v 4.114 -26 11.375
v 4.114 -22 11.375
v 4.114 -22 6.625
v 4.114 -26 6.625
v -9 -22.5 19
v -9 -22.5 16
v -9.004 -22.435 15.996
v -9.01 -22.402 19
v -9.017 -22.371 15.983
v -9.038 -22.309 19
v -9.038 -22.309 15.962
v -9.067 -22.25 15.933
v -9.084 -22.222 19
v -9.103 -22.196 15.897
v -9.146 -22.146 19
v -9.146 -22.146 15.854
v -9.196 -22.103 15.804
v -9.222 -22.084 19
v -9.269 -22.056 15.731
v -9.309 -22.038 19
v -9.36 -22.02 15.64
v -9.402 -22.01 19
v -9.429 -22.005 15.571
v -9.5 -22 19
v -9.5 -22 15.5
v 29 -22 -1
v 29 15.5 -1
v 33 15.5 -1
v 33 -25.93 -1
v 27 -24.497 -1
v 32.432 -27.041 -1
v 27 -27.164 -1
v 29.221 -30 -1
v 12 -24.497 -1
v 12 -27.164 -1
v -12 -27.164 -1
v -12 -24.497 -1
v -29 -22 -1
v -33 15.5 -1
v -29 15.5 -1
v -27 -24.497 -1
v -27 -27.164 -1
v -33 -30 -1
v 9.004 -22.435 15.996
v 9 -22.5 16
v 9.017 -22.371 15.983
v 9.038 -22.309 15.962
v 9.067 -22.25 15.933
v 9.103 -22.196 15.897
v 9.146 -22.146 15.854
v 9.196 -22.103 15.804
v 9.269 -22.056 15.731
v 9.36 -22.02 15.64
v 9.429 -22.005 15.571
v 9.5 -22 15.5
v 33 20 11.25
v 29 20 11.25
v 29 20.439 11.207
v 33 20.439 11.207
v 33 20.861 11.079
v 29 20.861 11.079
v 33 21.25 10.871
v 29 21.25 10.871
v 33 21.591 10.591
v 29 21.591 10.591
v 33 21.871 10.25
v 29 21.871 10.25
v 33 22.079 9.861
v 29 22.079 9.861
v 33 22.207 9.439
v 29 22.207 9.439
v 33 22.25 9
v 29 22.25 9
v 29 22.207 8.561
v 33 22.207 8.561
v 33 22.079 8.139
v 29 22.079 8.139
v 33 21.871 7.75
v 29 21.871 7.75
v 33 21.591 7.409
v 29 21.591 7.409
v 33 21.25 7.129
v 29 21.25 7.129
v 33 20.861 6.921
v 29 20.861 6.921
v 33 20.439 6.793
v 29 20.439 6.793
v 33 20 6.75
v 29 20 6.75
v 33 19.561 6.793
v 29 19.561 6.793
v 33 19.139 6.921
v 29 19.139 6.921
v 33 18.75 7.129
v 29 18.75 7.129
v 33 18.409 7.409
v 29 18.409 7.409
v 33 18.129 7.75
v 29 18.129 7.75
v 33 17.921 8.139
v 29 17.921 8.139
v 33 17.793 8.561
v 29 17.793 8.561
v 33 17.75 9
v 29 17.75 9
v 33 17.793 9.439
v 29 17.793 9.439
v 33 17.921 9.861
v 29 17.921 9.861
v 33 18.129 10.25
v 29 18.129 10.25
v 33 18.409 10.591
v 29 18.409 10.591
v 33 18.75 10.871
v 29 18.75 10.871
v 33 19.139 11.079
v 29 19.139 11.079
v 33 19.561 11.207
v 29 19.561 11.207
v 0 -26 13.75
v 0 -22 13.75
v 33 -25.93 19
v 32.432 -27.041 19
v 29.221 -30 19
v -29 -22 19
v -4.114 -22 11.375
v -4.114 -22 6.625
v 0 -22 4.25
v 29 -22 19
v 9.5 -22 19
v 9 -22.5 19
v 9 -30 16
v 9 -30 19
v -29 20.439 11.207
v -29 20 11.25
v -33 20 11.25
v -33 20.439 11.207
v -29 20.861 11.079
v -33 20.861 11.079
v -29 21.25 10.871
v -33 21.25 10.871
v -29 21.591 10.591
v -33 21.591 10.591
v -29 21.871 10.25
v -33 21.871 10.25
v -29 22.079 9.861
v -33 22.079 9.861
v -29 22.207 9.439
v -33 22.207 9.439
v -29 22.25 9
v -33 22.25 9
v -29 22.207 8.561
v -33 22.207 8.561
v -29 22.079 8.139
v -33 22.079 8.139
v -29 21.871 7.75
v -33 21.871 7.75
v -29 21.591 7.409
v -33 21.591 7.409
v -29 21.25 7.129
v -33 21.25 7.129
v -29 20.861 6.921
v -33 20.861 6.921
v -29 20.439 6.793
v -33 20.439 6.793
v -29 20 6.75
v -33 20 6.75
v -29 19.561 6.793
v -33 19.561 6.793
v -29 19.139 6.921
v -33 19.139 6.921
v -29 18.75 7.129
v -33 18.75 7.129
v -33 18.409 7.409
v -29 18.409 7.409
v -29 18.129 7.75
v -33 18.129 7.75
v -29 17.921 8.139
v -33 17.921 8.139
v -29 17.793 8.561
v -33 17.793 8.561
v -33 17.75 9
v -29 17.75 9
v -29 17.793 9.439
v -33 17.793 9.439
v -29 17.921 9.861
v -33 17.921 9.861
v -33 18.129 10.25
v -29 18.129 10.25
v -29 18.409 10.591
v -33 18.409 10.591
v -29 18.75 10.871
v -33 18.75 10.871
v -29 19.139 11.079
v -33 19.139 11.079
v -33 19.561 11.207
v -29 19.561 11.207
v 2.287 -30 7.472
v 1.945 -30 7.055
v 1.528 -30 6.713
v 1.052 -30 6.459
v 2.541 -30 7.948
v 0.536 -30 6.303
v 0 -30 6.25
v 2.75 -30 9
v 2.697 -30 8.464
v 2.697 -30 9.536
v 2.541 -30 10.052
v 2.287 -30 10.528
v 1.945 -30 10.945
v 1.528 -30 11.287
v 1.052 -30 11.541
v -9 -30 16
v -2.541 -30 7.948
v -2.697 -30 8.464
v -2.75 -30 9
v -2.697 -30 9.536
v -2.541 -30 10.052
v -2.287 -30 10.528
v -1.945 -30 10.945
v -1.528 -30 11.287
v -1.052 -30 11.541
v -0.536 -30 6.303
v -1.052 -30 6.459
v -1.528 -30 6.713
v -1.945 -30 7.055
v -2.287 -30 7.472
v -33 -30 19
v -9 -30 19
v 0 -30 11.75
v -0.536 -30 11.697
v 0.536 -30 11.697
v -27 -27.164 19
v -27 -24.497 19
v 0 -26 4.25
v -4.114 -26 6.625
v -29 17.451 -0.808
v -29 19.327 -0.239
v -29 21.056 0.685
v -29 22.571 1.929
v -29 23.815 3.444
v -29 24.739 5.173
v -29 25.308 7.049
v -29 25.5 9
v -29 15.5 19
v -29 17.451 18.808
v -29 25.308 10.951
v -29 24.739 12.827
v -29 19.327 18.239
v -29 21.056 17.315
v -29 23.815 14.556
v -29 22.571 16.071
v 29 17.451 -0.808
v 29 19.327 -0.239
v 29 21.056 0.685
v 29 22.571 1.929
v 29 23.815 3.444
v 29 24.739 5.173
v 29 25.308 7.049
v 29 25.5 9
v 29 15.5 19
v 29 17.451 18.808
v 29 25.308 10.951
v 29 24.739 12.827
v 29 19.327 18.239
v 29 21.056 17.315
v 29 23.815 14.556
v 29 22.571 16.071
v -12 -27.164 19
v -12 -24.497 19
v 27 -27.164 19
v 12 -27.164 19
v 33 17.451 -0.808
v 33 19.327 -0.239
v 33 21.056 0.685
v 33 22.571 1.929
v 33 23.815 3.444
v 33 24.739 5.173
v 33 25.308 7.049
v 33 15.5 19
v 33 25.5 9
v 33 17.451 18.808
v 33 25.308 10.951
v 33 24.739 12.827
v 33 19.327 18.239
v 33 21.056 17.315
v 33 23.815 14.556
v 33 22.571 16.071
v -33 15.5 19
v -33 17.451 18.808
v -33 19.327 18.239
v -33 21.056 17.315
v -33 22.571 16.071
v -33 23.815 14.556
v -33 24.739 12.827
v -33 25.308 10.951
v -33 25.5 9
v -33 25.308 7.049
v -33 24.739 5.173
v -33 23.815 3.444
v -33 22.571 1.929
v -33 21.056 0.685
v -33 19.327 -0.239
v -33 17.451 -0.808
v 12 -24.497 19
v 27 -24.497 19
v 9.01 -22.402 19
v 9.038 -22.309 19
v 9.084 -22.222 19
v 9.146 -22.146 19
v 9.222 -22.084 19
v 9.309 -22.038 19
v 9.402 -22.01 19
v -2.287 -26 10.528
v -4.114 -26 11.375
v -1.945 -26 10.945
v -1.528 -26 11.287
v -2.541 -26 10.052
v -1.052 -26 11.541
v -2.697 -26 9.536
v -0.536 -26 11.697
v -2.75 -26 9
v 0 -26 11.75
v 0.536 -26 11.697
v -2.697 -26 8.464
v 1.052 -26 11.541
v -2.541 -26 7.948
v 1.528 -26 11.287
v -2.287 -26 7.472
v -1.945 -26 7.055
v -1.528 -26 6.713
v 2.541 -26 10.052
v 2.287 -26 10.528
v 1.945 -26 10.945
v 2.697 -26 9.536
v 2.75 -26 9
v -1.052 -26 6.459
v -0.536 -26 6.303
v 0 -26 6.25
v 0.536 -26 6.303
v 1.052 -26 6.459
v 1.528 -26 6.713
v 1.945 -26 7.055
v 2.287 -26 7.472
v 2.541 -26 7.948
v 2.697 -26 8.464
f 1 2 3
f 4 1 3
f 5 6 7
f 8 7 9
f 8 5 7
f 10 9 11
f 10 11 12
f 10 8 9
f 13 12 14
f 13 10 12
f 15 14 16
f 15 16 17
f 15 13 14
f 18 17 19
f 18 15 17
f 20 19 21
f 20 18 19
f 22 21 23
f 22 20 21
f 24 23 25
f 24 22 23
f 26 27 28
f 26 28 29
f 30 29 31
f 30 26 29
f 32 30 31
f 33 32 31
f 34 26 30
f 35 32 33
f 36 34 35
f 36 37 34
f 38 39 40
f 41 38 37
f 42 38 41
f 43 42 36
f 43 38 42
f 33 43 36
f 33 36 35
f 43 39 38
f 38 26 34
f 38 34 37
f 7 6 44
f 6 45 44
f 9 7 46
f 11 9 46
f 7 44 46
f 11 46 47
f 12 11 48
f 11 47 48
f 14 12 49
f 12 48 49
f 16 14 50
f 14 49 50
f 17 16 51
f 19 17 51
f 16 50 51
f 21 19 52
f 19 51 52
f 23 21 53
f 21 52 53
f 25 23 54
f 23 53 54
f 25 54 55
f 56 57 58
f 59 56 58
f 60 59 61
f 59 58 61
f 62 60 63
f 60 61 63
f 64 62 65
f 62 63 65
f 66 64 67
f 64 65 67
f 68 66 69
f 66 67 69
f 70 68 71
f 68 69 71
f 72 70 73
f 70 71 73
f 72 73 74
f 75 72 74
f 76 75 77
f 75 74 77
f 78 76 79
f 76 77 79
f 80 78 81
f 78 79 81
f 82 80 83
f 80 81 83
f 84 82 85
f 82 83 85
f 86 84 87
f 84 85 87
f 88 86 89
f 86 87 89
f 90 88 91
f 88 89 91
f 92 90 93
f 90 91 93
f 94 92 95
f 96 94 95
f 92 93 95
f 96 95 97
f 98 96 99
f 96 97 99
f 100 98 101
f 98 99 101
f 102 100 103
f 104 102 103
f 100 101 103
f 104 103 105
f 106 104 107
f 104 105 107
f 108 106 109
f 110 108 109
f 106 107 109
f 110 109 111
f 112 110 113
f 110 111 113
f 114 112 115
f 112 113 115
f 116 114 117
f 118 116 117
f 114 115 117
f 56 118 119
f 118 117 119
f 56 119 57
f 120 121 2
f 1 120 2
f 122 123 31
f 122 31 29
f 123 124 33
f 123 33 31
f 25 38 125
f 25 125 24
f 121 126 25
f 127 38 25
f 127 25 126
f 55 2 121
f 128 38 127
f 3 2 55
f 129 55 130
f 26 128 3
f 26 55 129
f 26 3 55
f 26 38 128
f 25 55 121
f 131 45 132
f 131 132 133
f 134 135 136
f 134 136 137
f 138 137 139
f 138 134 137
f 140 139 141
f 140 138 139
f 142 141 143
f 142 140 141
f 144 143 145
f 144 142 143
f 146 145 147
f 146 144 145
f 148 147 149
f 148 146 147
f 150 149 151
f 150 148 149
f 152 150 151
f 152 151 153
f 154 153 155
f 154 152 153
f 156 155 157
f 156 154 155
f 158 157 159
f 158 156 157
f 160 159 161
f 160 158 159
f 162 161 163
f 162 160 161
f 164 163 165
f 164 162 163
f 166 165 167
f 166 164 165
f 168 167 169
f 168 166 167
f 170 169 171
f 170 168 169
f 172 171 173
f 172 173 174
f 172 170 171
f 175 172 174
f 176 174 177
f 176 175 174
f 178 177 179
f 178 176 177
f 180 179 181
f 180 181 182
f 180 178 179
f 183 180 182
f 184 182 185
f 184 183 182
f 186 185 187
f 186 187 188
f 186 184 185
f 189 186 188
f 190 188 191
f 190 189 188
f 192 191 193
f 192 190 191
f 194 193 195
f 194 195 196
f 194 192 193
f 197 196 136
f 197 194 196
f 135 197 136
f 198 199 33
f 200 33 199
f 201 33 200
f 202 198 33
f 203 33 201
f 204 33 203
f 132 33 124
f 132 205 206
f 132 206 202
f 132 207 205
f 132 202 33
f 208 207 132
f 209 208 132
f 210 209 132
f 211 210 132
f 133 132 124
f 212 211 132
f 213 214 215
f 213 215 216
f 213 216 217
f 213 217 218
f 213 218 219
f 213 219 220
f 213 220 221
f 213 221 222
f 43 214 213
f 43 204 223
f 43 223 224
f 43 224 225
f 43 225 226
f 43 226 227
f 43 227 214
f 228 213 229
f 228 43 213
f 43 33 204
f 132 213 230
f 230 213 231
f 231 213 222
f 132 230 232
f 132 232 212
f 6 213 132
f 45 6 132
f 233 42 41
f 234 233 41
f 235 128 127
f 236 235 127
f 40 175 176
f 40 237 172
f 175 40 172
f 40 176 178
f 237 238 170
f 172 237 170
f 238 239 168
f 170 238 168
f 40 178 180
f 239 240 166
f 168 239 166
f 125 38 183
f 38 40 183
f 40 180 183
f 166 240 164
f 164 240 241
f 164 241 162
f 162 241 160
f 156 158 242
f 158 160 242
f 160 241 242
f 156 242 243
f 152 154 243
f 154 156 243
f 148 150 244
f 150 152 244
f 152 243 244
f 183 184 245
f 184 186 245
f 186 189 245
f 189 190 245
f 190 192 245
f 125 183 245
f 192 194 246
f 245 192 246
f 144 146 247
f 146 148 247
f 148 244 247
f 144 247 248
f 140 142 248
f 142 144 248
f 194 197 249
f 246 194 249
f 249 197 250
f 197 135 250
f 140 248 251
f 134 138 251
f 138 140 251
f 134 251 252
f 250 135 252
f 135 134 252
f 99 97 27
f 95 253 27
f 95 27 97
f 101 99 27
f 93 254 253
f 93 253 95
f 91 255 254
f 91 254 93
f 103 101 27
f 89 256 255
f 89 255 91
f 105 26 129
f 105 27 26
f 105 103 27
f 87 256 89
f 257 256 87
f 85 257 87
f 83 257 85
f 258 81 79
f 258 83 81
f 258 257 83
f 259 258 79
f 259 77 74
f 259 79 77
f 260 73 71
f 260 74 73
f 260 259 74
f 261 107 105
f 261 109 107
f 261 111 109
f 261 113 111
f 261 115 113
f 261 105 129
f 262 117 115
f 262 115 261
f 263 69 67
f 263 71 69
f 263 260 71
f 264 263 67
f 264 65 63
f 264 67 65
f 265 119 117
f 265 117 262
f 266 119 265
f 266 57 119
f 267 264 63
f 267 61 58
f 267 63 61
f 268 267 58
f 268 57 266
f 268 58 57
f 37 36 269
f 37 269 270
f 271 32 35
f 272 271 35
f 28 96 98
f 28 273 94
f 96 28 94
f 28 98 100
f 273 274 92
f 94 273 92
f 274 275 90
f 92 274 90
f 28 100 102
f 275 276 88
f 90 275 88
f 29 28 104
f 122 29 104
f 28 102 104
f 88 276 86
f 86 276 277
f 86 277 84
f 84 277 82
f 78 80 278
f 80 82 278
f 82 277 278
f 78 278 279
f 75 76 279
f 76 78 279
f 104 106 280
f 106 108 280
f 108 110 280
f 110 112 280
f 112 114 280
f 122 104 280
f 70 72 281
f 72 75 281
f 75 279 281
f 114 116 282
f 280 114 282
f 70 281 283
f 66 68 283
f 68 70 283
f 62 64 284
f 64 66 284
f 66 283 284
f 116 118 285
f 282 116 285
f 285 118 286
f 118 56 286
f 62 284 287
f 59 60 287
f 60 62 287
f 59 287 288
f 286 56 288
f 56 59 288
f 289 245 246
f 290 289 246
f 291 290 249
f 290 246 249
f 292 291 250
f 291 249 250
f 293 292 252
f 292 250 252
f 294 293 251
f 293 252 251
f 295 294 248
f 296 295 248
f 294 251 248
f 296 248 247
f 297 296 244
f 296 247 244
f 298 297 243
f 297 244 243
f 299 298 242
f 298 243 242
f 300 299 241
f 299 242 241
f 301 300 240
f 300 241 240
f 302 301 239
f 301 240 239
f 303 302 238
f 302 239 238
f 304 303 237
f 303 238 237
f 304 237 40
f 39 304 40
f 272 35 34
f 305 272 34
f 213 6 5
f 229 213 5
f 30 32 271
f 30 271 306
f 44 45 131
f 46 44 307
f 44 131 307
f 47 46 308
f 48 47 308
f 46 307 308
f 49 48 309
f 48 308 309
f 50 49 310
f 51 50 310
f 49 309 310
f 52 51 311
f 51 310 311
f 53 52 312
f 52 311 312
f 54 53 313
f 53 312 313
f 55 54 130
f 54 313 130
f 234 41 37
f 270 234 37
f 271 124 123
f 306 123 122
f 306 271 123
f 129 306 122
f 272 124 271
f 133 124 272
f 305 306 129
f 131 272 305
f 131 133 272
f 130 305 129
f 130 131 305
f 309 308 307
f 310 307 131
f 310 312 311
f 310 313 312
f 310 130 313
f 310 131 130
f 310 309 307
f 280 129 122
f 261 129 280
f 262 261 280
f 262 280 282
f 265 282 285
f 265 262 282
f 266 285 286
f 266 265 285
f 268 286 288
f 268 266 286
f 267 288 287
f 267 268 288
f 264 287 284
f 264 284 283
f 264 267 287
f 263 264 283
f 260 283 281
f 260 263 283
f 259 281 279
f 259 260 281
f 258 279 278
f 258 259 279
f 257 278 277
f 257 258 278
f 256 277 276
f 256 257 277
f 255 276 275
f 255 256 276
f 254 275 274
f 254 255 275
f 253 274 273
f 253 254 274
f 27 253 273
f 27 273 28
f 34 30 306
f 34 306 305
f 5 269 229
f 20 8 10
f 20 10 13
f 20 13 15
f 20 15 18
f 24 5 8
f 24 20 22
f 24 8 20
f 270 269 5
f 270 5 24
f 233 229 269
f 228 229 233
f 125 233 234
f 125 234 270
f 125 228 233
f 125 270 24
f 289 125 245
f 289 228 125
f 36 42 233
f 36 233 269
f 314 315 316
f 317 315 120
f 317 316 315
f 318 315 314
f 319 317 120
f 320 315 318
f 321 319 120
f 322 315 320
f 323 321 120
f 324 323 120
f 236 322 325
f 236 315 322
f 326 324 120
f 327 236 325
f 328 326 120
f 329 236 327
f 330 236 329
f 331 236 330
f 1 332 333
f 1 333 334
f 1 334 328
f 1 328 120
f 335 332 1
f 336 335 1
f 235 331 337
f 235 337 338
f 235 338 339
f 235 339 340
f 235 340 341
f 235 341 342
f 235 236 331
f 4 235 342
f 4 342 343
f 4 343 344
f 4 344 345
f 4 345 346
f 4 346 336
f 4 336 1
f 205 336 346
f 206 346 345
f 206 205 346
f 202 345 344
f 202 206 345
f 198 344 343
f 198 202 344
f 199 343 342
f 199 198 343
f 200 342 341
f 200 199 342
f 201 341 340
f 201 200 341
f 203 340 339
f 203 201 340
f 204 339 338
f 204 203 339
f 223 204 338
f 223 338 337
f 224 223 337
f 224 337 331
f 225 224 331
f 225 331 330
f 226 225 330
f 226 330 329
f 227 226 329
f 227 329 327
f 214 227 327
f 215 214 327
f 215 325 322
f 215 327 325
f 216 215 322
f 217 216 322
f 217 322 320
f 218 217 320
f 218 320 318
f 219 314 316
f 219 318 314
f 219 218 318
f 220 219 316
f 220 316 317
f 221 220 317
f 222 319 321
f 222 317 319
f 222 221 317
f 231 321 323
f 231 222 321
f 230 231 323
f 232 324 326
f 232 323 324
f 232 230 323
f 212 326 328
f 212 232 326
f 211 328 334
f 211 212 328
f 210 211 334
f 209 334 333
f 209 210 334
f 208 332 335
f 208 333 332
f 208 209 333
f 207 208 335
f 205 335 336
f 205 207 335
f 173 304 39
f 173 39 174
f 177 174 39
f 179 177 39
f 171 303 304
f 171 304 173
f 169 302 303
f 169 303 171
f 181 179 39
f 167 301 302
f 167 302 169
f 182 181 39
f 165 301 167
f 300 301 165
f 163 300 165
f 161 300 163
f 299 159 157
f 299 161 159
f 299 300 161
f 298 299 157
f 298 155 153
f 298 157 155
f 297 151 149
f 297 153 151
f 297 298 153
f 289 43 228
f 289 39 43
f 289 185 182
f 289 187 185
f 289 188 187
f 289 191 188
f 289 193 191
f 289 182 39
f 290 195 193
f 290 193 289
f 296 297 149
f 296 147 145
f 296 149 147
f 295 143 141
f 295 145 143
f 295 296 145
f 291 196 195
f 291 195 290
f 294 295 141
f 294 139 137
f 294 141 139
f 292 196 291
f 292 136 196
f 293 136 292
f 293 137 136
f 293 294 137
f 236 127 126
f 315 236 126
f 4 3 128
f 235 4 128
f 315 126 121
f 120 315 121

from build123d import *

# Parameters (mm, degrees)
SKETCH005_W             = 58
SKETCH005_H             = 20
SKETCH005_R             = 2.75
PAD004_DEPTH            = 8
SKETCH006_R             = 2.25
PAD005_DEPTH            = 4
POCKET005_DEPTH         = 4
SKETCH011_W             = 15
SKETCH011_H             = 2.666667
POCKET007_DEPTH         = 20
SKETCH012_W             = 18
SKETCH012_H             = 3
POCKET008_DEPTH         = 8
FILLET_R                = 0.5
POCKET009_DEPTH         = 20
BODY002_PLACEMENT_ANGLE = 180


with BuildPart() as part:
    # Sketch005 → Pad004 (new body)
    with BuildSketch(Plane.XZ):
        Rectangle(SKETCH005_W, SKETCH005_H)
        Circle(SKETCH005_R, mode=Mode.SUBTRACT)
    extrude(amount=PAD004_DEPTH)

    # Sketch006 (on Face4 of Pad004) → Pad005 (join)
    with BuildSketch(Plane(origin=(-29, 0, 0), x_dir=(0, 0, -1), z_dir=(-1, 0, 0))):
        with BuildLine():
            Line((-10, 0), (10, 0))
            Line((10, 0), (10, 45.5))
            ThreePointArc((10, 45.5), (0, 55.5), (-10, 45.5))
            Line((-10, 45.5), (-10, 0))
        make_face()
        with Locations((0, 50)):
            Circle(SKETCH006_R, mode=Mode.SUBTRACT)
    pad005 = extrude(amount=PAD005_DEPTH)

    # Mirrored003: Pad005 across YZ
    add(pad005.mirror(Plane.YZ))

    # Sketch007 (on Face5 of Mirrored003) → Pocket005 (cut)
    with BuildSketch(Plane.XZ.offset(8)):
        Polygon((4.113621, 2.375), (0, 4.75), (-4.113621, 2.375), (-4.113621, -2.375), (0, -4.75), (4.113621, -2.375), align=None)
    extrude(amount=-POCKET005_DEPTH, mode=Mode.SUBTRACT)

    # Sketch011 (on Face14 of Pocket005) → Pocket007 (cut)
    with BuildSketch(Plane(origin=(0, 0, 10), x_dir=(-1, 0, 0), z_dir=(0, 0, 1))):
        with Locations((-19.5, 4.169504)):
            Rectangle(SKETCH011_W, SKETCH011_H)
    pocket007 = extrude(amount=-POCKET007_DEPTH, mode=Mode.SUBTRACT)

    # Mirrored004: Pocket007 across YZ
    add(pocket007.mirror(Plane.YZ), mode=Mode.SUBTRACT)

    # Sketch012 (on Face3 of Mirrored004) → Pocket008 (cut)
    with BuildSketch(Plane(origin=(0, 0, 0), x_dir=(1, 0, 0), z_dir=(0, 1, 0))):
        with Locations((0, 8.5)):
            Rectangle(SKETCH012_W, SKETCH012_H)
    extrude(amount=-POCKET008_DEPTH, mode=Mode.SUBTRACT)

    # Fillet
    fillet_edges = [part.edges().sort_by_distance(p)[0] for p in [
        (0, -8, -7),
        (9, -8, -8.5),
        (-9, -8, -8.5),
    ]]
    fillet(fillet_edges, radius=FILLET_R)

    # Sketch013 (on Face35 of Fillet) → Pocket009 (cut)
    with BuildSketch(Plane(origin=(0, 0, 10), x_dir=(-1, 0, 0), z_dir=(0, 0, 1))):
        Polygon((-29.221134, 0), (-32.431889, 2.958548), (-33, 4.069963), (-33, 0), align=None)
    extrude(amount=-POCKET009_DEPTH, mode=Mode.SUBTRACT)


with BuildPart() as part_1:
    # Body002 placement: moved
    add(part.part.moved(Location((0, -30, 9))).rotate(Axis((0, -30, 9), (1, 0, 0)), BODY002_PLACEMENT_ANGLE))


solid = part_1.part
